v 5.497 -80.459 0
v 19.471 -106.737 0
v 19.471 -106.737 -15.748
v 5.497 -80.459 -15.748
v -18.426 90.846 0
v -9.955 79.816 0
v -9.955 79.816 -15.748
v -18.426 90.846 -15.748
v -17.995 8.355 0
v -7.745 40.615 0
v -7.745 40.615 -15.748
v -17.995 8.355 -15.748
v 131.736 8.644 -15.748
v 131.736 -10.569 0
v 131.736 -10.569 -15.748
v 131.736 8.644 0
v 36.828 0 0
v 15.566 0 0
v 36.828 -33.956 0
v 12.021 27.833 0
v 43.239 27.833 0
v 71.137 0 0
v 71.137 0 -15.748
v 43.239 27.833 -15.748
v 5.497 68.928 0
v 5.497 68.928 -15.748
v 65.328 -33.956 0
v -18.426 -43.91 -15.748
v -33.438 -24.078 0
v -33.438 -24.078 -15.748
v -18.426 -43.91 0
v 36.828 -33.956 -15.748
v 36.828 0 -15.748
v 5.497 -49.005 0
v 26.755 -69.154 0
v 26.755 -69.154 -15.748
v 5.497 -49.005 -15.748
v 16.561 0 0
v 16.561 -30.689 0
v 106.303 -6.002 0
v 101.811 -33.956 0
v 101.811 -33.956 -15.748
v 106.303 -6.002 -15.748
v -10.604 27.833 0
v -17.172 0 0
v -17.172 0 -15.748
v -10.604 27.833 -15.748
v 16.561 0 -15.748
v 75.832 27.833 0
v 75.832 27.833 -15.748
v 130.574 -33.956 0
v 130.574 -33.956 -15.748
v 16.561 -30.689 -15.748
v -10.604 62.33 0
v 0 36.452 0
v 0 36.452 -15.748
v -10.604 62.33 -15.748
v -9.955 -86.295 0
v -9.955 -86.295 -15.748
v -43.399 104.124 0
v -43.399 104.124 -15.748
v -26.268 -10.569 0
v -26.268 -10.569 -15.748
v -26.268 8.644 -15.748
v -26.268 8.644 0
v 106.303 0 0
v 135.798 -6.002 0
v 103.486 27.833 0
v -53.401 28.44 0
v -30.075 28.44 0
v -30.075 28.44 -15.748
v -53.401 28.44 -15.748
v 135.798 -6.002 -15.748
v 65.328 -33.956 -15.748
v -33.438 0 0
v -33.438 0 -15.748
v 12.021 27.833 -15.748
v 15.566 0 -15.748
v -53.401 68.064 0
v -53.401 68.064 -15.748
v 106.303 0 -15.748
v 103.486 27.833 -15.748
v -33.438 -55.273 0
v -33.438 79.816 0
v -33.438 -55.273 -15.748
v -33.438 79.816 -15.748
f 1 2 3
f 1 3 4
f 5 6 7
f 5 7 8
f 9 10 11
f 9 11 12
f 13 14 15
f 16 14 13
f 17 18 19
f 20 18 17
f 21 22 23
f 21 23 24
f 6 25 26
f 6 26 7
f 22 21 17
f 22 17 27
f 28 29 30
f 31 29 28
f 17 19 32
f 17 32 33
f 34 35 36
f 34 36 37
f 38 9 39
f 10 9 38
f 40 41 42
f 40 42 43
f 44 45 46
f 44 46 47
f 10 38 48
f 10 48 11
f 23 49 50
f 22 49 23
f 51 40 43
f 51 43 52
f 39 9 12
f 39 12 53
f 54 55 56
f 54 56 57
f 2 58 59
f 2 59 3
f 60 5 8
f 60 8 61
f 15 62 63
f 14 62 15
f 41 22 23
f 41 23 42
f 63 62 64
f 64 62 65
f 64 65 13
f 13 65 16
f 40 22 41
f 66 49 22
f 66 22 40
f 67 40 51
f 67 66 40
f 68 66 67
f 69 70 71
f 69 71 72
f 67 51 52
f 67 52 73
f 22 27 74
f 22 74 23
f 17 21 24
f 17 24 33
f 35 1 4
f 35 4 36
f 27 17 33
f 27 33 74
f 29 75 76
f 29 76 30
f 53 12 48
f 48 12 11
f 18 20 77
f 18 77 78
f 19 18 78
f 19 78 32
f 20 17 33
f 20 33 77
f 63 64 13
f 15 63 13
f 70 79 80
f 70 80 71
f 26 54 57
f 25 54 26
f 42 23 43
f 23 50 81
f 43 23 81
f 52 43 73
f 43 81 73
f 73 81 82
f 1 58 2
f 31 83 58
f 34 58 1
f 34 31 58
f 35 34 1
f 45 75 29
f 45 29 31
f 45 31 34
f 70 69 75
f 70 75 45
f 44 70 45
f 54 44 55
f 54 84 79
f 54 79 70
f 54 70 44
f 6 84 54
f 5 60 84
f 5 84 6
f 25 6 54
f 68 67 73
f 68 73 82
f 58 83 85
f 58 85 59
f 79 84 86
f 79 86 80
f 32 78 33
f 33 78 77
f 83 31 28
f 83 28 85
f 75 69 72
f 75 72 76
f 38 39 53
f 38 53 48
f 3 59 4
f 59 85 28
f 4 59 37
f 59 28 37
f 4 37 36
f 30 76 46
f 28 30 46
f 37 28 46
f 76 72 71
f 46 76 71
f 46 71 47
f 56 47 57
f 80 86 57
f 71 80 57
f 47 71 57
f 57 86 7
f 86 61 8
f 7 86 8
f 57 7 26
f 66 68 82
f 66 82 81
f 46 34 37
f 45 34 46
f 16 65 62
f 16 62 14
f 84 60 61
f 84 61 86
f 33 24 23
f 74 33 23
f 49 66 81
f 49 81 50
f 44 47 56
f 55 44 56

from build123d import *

# Parameters (mm, degrees)
F1_DEPTH = 15.748
F3_DEPTH = 15.748
F4_W     = 158.00403
F4_H     = 19.213128
F5_DEPTH = 15.748


with BuildPart() as f1:
    # F0 (on Top) → F1 (new body)
    with BuildSketch(Plane.XY):
        Polygon((5.496666, -49.005345), (-17.171966, 0), (-10.603819, 27.832607), (0, 36.452203), (-10.603819, 62.330257), (5.496666, 68.927609), (-9.955005, 79.81591), (-18.426025, 90.846337), (-33.438079, 79.81591), (-30.075414, 28.44004), (-53.400997, 28.44004), (-33.438079, 0), (-33.438079, -24.078102), (-18.426025, -43.909597), (-33.438079, -55.273429), (-9.955005, -86.295463), (19.471411, -106.737158), (5.496666, -80.458798), (26.754644, -69.153875), align=None)
        Polygon((-30.075414, 28.44004), (-33.438079, 79.81591), (-53.400997, 68.064377), align=None)
        Polygon((-33.438079, 79.81591), (-18.426025, 90.846337), (-43.398742, 104.124375), align=None)
        Polygon((12.020655, 27.832607), (15.566137, 0), (36.828335, -33.955548), (36.828335, 0), align=None)
        Polygon((43.238979, 27.832607), (36.828335, 0), (65.328278, -33.955548), (71.136542, 0), align=None)
        Polygon((75.832263, 27.832607), (71.136542, 0), (101.81126, -33.955548), (106.303364, -6.002302), (130.573601, -33.955548), (135.798305, -6.002302), (103.48627, 27.832607), (106.303364, 0), align=None)
    extrude(amount=-F1_DEPTH)


with BuildPart() as f3:
    # F2 (on Top) → F3 (new body)
    with BuildSketch(Plane.XY):
        Polygon((16.561132, -30.689333), (16.561132, 0), (-17.994851, 8.354522), align=None)
        Polygon((-17.994851, 8.354522), (16.561132, 0), (-7.744826, 40.615108), align=None)
    extrude(amount=-F3_DEPTH)


with BuildPart() as f5:
    # F4 (on Top) → F5 (new body)
    with BuildSketch(Plane.XY):
        with Locations((52.734472, -0.962363)):
            Rectangle(F4_W, F4_H)
    extrude(amount=-F5_DEPTH)


solid = Compound([f1.part, f3.part, f5.part])
